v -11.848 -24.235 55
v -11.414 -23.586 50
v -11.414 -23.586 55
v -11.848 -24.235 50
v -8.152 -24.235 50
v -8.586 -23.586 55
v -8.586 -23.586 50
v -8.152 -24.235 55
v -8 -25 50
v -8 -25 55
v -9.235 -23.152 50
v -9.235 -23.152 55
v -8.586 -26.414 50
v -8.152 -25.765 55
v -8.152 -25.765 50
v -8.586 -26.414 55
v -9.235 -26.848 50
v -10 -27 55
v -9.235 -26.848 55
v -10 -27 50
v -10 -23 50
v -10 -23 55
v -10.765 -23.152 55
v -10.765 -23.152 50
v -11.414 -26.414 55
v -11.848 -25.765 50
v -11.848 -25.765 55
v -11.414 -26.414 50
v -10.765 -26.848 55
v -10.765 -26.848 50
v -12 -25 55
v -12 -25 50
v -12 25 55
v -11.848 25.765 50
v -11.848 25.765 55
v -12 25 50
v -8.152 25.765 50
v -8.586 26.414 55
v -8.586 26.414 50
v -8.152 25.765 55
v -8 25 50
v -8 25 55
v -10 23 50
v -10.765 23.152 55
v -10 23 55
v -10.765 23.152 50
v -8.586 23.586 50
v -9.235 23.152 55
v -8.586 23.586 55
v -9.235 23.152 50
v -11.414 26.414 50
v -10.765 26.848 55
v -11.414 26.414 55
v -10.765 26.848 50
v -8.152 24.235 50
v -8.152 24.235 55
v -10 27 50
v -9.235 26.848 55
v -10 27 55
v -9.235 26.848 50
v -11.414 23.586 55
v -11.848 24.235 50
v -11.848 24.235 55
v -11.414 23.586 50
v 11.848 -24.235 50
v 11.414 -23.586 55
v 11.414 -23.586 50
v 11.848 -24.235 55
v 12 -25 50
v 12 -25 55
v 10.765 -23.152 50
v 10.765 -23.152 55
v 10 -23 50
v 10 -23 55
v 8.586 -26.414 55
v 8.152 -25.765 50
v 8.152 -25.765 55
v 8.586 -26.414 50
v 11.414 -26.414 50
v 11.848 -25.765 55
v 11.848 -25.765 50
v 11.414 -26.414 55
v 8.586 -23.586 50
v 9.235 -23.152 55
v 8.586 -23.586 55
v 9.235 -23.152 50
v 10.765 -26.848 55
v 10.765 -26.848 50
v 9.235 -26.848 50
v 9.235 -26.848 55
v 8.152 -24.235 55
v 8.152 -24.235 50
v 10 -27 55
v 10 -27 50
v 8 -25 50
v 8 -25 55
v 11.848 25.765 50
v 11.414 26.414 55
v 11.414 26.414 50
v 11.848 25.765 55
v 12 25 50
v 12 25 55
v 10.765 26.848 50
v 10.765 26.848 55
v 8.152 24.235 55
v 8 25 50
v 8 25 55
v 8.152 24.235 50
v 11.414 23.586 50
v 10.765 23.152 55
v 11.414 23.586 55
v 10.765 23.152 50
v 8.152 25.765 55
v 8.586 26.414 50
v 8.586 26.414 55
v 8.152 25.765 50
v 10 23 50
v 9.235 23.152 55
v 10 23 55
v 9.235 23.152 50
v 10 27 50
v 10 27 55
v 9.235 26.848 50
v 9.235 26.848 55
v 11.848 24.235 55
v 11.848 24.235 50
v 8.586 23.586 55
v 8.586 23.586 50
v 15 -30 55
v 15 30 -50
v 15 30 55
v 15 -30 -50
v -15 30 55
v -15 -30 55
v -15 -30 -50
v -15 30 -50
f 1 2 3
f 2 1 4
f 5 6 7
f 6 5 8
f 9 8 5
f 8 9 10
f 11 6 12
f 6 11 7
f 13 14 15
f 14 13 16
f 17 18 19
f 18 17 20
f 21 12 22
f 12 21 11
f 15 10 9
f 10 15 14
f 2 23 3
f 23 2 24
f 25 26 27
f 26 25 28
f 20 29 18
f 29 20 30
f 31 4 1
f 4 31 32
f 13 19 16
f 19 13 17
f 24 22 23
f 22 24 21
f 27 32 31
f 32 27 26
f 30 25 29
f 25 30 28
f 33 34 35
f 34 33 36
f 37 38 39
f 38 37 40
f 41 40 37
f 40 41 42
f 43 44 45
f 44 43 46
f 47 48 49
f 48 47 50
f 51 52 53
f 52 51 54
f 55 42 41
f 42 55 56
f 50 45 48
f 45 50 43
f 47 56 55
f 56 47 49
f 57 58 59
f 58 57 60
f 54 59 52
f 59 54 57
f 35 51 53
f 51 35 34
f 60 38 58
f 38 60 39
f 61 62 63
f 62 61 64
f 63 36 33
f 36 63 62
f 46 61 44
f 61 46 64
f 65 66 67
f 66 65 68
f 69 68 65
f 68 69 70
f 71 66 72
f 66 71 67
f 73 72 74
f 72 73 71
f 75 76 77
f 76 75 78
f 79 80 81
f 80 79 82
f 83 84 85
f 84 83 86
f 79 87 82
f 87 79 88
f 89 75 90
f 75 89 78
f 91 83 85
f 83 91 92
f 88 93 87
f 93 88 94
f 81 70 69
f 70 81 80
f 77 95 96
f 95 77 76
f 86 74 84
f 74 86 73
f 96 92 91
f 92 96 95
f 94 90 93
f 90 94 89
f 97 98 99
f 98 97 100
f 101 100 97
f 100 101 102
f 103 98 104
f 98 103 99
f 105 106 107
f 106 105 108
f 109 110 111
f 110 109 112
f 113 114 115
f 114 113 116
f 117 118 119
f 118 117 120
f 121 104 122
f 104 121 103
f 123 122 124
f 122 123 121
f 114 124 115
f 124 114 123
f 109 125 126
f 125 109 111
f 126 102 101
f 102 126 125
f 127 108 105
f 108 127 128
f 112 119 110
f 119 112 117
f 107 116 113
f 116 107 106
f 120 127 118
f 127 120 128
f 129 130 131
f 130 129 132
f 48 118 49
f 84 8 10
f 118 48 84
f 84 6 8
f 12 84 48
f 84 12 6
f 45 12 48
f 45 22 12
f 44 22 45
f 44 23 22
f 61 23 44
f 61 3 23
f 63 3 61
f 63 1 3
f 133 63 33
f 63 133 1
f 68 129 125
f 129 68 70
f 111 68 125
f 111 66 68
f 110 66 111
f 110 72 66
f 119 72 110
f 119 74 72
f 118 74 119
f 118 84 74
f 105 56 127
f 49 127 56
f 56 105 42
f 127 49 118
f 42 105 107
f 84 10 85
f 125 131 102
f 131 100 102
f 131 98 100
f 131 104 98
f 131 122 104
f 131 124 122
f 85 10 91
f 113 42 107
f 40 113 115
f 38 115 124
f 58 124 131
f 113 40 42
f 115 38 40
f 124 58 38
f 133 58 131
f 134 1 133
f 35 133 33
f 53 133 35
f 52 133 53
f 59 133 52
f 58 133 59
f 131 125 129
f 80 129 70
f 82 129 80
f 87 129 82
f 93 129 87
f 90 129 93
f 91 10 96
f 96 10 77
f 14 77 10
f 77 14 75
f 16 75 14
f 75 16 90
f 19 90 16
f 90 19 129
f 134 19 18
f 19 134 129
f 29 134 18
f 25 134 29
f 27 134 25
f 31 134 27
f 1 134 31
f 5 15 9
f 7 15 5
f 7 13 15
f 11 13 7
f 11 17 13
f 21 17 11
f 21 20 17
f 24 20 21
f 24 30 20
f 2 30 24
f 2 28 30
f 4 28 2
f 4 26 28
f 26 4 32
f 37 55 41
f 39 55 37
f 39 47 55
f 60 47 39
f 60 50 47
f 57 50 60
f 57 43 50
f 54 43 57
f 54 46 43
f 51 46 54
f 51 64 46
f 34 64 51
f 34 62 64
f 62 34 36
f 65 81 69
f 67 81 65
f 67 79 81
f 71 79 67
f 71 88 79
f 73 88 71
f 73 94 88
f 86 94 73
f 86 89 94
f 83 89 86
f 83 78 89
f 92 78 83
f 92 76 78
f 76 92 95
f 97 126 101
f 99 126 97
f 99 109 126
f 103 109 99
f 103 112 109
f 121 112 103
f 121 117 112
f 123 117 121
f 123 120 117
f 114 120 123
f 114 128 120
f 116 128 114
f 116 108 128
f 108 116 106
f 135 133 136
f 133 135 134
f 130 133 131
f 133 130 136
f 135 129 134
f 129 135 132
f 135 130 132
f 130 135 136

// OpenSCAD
// Parameters
cross_section_width_mm = 30; //[15:60:1]
cross_section_height_mm = 60; //[30:120:1]
length_mm = 100; //[50:200:1]

// Extrusion - complete geometry
module extrusion() {
  color("Silver") {
    // Main body
    cube([cross_section_width_mm, cross_section_height_mm, length_mm], center=true);
  }
}

// Extrusion Cross Section - detailed geometry
module extrusion_cross_section() {
  color("DimGray") {
    // Cross section with corner holes
    difference() {
      cube([cross_section_width_mm, cross_section_height_mm, 5], center=true);
      for (x = [-cross_section_width_mm/2 + 5, cross_section_width_mm/2 - 5])
        for (y = [-cross_section_height_mm/2 + 5, cross_section_height_mm/2 - 5])
          translate([x, y, 0]) cylinder(d=4, h=10, center=true, $fn=16);
    }
  }
}

// Box Corner Profile Section - detailed geometry
module box_corner_profile_section() {
  color("Black") {
    // Corner profile with a hole
    difference() {
      cube([10, 10, length_mm], center=true);
      translate([0, 0, 0]) cylinder(d=3, h=length_mm + 2, center=true, $fn=16);
    }
  }
}

// Box Corner Profile Sections - detailed geometry
module box_corner_profile_sections() {
  color("Black") {
    // Four corner profiles
    for (x = [-cross_section_width_mm/2 + 5, cross_section_width_mm/2 - 5])
      for (y = [-cross_section_height_mm/2 + 5, cross_section_height_mm/2 - 5])
        translate([x, y, 0]) box_corner_profile_section();
  }
}

// Assembly
module assembly() {
  extrusion();
  translate([0, 0, length_mm/2 + 2.5]) extrusion_cross_section();
  box_corner_profile_sections();
}

assembly();
